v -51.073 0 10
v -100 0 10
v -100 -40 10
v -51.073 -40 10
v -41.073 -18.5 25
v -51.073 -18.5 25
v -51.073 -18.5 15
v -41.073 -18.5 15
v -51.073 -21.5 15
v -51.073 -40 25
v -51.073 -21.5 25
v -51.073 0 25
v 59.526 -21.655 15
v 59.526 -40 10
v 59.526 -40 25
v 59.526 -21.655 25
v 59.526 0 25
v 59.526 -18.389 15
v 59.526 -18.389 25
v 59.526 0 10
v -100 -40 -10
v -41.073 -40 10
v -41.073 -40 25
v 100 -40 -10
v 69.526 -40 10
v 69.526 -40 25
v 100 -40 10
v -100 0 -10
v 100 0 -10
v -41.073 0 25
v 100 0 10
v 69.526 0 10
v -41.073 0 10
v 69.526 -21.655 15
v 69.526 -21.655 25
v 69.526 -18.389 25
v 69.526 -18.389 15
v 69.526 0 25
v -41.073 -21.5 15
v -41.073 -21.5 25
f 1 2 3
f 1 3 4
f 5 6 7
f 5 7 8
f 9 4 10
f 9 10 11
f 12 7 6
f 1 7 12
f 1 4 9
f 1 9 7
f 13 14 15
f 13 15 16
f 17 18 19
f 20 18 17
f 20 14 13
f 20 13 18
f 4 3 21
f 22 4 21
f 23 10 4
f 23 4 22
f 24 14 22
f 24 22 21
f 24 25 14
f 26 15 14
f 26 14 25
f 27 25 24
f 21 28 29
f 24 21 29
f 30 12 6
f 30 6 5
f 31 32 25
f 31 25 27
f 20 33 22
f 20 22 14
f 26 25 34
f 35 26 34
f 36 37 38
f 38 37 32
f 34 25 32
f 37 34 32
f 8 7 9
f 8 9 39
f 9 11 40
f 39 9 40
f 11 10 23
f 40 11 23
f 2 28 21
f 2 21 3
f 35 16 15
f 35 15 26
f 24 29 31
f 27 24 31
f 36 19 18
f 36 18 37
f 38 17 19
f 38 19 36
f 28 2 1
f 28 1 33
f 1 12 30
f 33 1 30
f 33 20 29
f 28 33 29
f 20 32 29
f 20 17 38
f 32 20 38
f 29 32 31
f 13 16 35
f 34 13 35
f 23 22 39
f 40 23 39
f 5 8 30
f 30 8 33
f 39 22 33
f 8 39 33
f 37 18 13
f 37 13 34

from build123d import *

# Parameters (mm, degrees)
F0_W     = 200
F0_H     = 20
F1_DEPTH = 40
F2_W     = 10
F2_H     = 40
F3_DEPTH = 10
F4_DEPTH = 15
F5_W     = 10
F5_H     = 3
F6_DEPTH = 10
F7_W     = 10
F7_H     = 3.26613
F8_DEPTH = 10


with BuildPart() as f1:
    # F0 (on Front) → F1 (new body)
    with BuildSketch(Plane.XZ):
        Rectangle(F0_W, F0_H)
    extrude(amount=F1_DEPTH)

    # F2 (on face) → F3 (join)
    with BuildSketch(Plane.XY.offset(10)):
        with Locations((64.525982, -20)):
            Rectangle(F2_W, F2_H)
    extrude(amount=F3_DEPTH)

    # F2 (on face) → F4 (join)
    with BuildSketch(Plane.XY.offset(10)):
        with Locations((64.525982, -20)):
            Rectangle(F2_W, F2_H)
        with Locations((-46.073499, -20)):
            Rectangle(F2_W, F2_H)
    extrude(amount=F4_DEPTH)

    # F5 (on face) → F6 (cut)
    with BuildSketch(Plane.XY.offset(25)):
        with Locations((-46.073499, -20)):
            Rectangle(F5_W, F5_H)
    extrude(amount=-F6_DEPTH, mode=Mode.SUBTRACT)

    # F7 (on face) → F8 (cut)
    with BuildSketch(Plane.XY.offset(25)):
        with Locations((64.525982, -20.022178)):
            Rectangle(F7_W, F7_H)
    extrude(amount=-F8_DEPTH, mode=Mode.SUBTRACT)


solid = f1.part
